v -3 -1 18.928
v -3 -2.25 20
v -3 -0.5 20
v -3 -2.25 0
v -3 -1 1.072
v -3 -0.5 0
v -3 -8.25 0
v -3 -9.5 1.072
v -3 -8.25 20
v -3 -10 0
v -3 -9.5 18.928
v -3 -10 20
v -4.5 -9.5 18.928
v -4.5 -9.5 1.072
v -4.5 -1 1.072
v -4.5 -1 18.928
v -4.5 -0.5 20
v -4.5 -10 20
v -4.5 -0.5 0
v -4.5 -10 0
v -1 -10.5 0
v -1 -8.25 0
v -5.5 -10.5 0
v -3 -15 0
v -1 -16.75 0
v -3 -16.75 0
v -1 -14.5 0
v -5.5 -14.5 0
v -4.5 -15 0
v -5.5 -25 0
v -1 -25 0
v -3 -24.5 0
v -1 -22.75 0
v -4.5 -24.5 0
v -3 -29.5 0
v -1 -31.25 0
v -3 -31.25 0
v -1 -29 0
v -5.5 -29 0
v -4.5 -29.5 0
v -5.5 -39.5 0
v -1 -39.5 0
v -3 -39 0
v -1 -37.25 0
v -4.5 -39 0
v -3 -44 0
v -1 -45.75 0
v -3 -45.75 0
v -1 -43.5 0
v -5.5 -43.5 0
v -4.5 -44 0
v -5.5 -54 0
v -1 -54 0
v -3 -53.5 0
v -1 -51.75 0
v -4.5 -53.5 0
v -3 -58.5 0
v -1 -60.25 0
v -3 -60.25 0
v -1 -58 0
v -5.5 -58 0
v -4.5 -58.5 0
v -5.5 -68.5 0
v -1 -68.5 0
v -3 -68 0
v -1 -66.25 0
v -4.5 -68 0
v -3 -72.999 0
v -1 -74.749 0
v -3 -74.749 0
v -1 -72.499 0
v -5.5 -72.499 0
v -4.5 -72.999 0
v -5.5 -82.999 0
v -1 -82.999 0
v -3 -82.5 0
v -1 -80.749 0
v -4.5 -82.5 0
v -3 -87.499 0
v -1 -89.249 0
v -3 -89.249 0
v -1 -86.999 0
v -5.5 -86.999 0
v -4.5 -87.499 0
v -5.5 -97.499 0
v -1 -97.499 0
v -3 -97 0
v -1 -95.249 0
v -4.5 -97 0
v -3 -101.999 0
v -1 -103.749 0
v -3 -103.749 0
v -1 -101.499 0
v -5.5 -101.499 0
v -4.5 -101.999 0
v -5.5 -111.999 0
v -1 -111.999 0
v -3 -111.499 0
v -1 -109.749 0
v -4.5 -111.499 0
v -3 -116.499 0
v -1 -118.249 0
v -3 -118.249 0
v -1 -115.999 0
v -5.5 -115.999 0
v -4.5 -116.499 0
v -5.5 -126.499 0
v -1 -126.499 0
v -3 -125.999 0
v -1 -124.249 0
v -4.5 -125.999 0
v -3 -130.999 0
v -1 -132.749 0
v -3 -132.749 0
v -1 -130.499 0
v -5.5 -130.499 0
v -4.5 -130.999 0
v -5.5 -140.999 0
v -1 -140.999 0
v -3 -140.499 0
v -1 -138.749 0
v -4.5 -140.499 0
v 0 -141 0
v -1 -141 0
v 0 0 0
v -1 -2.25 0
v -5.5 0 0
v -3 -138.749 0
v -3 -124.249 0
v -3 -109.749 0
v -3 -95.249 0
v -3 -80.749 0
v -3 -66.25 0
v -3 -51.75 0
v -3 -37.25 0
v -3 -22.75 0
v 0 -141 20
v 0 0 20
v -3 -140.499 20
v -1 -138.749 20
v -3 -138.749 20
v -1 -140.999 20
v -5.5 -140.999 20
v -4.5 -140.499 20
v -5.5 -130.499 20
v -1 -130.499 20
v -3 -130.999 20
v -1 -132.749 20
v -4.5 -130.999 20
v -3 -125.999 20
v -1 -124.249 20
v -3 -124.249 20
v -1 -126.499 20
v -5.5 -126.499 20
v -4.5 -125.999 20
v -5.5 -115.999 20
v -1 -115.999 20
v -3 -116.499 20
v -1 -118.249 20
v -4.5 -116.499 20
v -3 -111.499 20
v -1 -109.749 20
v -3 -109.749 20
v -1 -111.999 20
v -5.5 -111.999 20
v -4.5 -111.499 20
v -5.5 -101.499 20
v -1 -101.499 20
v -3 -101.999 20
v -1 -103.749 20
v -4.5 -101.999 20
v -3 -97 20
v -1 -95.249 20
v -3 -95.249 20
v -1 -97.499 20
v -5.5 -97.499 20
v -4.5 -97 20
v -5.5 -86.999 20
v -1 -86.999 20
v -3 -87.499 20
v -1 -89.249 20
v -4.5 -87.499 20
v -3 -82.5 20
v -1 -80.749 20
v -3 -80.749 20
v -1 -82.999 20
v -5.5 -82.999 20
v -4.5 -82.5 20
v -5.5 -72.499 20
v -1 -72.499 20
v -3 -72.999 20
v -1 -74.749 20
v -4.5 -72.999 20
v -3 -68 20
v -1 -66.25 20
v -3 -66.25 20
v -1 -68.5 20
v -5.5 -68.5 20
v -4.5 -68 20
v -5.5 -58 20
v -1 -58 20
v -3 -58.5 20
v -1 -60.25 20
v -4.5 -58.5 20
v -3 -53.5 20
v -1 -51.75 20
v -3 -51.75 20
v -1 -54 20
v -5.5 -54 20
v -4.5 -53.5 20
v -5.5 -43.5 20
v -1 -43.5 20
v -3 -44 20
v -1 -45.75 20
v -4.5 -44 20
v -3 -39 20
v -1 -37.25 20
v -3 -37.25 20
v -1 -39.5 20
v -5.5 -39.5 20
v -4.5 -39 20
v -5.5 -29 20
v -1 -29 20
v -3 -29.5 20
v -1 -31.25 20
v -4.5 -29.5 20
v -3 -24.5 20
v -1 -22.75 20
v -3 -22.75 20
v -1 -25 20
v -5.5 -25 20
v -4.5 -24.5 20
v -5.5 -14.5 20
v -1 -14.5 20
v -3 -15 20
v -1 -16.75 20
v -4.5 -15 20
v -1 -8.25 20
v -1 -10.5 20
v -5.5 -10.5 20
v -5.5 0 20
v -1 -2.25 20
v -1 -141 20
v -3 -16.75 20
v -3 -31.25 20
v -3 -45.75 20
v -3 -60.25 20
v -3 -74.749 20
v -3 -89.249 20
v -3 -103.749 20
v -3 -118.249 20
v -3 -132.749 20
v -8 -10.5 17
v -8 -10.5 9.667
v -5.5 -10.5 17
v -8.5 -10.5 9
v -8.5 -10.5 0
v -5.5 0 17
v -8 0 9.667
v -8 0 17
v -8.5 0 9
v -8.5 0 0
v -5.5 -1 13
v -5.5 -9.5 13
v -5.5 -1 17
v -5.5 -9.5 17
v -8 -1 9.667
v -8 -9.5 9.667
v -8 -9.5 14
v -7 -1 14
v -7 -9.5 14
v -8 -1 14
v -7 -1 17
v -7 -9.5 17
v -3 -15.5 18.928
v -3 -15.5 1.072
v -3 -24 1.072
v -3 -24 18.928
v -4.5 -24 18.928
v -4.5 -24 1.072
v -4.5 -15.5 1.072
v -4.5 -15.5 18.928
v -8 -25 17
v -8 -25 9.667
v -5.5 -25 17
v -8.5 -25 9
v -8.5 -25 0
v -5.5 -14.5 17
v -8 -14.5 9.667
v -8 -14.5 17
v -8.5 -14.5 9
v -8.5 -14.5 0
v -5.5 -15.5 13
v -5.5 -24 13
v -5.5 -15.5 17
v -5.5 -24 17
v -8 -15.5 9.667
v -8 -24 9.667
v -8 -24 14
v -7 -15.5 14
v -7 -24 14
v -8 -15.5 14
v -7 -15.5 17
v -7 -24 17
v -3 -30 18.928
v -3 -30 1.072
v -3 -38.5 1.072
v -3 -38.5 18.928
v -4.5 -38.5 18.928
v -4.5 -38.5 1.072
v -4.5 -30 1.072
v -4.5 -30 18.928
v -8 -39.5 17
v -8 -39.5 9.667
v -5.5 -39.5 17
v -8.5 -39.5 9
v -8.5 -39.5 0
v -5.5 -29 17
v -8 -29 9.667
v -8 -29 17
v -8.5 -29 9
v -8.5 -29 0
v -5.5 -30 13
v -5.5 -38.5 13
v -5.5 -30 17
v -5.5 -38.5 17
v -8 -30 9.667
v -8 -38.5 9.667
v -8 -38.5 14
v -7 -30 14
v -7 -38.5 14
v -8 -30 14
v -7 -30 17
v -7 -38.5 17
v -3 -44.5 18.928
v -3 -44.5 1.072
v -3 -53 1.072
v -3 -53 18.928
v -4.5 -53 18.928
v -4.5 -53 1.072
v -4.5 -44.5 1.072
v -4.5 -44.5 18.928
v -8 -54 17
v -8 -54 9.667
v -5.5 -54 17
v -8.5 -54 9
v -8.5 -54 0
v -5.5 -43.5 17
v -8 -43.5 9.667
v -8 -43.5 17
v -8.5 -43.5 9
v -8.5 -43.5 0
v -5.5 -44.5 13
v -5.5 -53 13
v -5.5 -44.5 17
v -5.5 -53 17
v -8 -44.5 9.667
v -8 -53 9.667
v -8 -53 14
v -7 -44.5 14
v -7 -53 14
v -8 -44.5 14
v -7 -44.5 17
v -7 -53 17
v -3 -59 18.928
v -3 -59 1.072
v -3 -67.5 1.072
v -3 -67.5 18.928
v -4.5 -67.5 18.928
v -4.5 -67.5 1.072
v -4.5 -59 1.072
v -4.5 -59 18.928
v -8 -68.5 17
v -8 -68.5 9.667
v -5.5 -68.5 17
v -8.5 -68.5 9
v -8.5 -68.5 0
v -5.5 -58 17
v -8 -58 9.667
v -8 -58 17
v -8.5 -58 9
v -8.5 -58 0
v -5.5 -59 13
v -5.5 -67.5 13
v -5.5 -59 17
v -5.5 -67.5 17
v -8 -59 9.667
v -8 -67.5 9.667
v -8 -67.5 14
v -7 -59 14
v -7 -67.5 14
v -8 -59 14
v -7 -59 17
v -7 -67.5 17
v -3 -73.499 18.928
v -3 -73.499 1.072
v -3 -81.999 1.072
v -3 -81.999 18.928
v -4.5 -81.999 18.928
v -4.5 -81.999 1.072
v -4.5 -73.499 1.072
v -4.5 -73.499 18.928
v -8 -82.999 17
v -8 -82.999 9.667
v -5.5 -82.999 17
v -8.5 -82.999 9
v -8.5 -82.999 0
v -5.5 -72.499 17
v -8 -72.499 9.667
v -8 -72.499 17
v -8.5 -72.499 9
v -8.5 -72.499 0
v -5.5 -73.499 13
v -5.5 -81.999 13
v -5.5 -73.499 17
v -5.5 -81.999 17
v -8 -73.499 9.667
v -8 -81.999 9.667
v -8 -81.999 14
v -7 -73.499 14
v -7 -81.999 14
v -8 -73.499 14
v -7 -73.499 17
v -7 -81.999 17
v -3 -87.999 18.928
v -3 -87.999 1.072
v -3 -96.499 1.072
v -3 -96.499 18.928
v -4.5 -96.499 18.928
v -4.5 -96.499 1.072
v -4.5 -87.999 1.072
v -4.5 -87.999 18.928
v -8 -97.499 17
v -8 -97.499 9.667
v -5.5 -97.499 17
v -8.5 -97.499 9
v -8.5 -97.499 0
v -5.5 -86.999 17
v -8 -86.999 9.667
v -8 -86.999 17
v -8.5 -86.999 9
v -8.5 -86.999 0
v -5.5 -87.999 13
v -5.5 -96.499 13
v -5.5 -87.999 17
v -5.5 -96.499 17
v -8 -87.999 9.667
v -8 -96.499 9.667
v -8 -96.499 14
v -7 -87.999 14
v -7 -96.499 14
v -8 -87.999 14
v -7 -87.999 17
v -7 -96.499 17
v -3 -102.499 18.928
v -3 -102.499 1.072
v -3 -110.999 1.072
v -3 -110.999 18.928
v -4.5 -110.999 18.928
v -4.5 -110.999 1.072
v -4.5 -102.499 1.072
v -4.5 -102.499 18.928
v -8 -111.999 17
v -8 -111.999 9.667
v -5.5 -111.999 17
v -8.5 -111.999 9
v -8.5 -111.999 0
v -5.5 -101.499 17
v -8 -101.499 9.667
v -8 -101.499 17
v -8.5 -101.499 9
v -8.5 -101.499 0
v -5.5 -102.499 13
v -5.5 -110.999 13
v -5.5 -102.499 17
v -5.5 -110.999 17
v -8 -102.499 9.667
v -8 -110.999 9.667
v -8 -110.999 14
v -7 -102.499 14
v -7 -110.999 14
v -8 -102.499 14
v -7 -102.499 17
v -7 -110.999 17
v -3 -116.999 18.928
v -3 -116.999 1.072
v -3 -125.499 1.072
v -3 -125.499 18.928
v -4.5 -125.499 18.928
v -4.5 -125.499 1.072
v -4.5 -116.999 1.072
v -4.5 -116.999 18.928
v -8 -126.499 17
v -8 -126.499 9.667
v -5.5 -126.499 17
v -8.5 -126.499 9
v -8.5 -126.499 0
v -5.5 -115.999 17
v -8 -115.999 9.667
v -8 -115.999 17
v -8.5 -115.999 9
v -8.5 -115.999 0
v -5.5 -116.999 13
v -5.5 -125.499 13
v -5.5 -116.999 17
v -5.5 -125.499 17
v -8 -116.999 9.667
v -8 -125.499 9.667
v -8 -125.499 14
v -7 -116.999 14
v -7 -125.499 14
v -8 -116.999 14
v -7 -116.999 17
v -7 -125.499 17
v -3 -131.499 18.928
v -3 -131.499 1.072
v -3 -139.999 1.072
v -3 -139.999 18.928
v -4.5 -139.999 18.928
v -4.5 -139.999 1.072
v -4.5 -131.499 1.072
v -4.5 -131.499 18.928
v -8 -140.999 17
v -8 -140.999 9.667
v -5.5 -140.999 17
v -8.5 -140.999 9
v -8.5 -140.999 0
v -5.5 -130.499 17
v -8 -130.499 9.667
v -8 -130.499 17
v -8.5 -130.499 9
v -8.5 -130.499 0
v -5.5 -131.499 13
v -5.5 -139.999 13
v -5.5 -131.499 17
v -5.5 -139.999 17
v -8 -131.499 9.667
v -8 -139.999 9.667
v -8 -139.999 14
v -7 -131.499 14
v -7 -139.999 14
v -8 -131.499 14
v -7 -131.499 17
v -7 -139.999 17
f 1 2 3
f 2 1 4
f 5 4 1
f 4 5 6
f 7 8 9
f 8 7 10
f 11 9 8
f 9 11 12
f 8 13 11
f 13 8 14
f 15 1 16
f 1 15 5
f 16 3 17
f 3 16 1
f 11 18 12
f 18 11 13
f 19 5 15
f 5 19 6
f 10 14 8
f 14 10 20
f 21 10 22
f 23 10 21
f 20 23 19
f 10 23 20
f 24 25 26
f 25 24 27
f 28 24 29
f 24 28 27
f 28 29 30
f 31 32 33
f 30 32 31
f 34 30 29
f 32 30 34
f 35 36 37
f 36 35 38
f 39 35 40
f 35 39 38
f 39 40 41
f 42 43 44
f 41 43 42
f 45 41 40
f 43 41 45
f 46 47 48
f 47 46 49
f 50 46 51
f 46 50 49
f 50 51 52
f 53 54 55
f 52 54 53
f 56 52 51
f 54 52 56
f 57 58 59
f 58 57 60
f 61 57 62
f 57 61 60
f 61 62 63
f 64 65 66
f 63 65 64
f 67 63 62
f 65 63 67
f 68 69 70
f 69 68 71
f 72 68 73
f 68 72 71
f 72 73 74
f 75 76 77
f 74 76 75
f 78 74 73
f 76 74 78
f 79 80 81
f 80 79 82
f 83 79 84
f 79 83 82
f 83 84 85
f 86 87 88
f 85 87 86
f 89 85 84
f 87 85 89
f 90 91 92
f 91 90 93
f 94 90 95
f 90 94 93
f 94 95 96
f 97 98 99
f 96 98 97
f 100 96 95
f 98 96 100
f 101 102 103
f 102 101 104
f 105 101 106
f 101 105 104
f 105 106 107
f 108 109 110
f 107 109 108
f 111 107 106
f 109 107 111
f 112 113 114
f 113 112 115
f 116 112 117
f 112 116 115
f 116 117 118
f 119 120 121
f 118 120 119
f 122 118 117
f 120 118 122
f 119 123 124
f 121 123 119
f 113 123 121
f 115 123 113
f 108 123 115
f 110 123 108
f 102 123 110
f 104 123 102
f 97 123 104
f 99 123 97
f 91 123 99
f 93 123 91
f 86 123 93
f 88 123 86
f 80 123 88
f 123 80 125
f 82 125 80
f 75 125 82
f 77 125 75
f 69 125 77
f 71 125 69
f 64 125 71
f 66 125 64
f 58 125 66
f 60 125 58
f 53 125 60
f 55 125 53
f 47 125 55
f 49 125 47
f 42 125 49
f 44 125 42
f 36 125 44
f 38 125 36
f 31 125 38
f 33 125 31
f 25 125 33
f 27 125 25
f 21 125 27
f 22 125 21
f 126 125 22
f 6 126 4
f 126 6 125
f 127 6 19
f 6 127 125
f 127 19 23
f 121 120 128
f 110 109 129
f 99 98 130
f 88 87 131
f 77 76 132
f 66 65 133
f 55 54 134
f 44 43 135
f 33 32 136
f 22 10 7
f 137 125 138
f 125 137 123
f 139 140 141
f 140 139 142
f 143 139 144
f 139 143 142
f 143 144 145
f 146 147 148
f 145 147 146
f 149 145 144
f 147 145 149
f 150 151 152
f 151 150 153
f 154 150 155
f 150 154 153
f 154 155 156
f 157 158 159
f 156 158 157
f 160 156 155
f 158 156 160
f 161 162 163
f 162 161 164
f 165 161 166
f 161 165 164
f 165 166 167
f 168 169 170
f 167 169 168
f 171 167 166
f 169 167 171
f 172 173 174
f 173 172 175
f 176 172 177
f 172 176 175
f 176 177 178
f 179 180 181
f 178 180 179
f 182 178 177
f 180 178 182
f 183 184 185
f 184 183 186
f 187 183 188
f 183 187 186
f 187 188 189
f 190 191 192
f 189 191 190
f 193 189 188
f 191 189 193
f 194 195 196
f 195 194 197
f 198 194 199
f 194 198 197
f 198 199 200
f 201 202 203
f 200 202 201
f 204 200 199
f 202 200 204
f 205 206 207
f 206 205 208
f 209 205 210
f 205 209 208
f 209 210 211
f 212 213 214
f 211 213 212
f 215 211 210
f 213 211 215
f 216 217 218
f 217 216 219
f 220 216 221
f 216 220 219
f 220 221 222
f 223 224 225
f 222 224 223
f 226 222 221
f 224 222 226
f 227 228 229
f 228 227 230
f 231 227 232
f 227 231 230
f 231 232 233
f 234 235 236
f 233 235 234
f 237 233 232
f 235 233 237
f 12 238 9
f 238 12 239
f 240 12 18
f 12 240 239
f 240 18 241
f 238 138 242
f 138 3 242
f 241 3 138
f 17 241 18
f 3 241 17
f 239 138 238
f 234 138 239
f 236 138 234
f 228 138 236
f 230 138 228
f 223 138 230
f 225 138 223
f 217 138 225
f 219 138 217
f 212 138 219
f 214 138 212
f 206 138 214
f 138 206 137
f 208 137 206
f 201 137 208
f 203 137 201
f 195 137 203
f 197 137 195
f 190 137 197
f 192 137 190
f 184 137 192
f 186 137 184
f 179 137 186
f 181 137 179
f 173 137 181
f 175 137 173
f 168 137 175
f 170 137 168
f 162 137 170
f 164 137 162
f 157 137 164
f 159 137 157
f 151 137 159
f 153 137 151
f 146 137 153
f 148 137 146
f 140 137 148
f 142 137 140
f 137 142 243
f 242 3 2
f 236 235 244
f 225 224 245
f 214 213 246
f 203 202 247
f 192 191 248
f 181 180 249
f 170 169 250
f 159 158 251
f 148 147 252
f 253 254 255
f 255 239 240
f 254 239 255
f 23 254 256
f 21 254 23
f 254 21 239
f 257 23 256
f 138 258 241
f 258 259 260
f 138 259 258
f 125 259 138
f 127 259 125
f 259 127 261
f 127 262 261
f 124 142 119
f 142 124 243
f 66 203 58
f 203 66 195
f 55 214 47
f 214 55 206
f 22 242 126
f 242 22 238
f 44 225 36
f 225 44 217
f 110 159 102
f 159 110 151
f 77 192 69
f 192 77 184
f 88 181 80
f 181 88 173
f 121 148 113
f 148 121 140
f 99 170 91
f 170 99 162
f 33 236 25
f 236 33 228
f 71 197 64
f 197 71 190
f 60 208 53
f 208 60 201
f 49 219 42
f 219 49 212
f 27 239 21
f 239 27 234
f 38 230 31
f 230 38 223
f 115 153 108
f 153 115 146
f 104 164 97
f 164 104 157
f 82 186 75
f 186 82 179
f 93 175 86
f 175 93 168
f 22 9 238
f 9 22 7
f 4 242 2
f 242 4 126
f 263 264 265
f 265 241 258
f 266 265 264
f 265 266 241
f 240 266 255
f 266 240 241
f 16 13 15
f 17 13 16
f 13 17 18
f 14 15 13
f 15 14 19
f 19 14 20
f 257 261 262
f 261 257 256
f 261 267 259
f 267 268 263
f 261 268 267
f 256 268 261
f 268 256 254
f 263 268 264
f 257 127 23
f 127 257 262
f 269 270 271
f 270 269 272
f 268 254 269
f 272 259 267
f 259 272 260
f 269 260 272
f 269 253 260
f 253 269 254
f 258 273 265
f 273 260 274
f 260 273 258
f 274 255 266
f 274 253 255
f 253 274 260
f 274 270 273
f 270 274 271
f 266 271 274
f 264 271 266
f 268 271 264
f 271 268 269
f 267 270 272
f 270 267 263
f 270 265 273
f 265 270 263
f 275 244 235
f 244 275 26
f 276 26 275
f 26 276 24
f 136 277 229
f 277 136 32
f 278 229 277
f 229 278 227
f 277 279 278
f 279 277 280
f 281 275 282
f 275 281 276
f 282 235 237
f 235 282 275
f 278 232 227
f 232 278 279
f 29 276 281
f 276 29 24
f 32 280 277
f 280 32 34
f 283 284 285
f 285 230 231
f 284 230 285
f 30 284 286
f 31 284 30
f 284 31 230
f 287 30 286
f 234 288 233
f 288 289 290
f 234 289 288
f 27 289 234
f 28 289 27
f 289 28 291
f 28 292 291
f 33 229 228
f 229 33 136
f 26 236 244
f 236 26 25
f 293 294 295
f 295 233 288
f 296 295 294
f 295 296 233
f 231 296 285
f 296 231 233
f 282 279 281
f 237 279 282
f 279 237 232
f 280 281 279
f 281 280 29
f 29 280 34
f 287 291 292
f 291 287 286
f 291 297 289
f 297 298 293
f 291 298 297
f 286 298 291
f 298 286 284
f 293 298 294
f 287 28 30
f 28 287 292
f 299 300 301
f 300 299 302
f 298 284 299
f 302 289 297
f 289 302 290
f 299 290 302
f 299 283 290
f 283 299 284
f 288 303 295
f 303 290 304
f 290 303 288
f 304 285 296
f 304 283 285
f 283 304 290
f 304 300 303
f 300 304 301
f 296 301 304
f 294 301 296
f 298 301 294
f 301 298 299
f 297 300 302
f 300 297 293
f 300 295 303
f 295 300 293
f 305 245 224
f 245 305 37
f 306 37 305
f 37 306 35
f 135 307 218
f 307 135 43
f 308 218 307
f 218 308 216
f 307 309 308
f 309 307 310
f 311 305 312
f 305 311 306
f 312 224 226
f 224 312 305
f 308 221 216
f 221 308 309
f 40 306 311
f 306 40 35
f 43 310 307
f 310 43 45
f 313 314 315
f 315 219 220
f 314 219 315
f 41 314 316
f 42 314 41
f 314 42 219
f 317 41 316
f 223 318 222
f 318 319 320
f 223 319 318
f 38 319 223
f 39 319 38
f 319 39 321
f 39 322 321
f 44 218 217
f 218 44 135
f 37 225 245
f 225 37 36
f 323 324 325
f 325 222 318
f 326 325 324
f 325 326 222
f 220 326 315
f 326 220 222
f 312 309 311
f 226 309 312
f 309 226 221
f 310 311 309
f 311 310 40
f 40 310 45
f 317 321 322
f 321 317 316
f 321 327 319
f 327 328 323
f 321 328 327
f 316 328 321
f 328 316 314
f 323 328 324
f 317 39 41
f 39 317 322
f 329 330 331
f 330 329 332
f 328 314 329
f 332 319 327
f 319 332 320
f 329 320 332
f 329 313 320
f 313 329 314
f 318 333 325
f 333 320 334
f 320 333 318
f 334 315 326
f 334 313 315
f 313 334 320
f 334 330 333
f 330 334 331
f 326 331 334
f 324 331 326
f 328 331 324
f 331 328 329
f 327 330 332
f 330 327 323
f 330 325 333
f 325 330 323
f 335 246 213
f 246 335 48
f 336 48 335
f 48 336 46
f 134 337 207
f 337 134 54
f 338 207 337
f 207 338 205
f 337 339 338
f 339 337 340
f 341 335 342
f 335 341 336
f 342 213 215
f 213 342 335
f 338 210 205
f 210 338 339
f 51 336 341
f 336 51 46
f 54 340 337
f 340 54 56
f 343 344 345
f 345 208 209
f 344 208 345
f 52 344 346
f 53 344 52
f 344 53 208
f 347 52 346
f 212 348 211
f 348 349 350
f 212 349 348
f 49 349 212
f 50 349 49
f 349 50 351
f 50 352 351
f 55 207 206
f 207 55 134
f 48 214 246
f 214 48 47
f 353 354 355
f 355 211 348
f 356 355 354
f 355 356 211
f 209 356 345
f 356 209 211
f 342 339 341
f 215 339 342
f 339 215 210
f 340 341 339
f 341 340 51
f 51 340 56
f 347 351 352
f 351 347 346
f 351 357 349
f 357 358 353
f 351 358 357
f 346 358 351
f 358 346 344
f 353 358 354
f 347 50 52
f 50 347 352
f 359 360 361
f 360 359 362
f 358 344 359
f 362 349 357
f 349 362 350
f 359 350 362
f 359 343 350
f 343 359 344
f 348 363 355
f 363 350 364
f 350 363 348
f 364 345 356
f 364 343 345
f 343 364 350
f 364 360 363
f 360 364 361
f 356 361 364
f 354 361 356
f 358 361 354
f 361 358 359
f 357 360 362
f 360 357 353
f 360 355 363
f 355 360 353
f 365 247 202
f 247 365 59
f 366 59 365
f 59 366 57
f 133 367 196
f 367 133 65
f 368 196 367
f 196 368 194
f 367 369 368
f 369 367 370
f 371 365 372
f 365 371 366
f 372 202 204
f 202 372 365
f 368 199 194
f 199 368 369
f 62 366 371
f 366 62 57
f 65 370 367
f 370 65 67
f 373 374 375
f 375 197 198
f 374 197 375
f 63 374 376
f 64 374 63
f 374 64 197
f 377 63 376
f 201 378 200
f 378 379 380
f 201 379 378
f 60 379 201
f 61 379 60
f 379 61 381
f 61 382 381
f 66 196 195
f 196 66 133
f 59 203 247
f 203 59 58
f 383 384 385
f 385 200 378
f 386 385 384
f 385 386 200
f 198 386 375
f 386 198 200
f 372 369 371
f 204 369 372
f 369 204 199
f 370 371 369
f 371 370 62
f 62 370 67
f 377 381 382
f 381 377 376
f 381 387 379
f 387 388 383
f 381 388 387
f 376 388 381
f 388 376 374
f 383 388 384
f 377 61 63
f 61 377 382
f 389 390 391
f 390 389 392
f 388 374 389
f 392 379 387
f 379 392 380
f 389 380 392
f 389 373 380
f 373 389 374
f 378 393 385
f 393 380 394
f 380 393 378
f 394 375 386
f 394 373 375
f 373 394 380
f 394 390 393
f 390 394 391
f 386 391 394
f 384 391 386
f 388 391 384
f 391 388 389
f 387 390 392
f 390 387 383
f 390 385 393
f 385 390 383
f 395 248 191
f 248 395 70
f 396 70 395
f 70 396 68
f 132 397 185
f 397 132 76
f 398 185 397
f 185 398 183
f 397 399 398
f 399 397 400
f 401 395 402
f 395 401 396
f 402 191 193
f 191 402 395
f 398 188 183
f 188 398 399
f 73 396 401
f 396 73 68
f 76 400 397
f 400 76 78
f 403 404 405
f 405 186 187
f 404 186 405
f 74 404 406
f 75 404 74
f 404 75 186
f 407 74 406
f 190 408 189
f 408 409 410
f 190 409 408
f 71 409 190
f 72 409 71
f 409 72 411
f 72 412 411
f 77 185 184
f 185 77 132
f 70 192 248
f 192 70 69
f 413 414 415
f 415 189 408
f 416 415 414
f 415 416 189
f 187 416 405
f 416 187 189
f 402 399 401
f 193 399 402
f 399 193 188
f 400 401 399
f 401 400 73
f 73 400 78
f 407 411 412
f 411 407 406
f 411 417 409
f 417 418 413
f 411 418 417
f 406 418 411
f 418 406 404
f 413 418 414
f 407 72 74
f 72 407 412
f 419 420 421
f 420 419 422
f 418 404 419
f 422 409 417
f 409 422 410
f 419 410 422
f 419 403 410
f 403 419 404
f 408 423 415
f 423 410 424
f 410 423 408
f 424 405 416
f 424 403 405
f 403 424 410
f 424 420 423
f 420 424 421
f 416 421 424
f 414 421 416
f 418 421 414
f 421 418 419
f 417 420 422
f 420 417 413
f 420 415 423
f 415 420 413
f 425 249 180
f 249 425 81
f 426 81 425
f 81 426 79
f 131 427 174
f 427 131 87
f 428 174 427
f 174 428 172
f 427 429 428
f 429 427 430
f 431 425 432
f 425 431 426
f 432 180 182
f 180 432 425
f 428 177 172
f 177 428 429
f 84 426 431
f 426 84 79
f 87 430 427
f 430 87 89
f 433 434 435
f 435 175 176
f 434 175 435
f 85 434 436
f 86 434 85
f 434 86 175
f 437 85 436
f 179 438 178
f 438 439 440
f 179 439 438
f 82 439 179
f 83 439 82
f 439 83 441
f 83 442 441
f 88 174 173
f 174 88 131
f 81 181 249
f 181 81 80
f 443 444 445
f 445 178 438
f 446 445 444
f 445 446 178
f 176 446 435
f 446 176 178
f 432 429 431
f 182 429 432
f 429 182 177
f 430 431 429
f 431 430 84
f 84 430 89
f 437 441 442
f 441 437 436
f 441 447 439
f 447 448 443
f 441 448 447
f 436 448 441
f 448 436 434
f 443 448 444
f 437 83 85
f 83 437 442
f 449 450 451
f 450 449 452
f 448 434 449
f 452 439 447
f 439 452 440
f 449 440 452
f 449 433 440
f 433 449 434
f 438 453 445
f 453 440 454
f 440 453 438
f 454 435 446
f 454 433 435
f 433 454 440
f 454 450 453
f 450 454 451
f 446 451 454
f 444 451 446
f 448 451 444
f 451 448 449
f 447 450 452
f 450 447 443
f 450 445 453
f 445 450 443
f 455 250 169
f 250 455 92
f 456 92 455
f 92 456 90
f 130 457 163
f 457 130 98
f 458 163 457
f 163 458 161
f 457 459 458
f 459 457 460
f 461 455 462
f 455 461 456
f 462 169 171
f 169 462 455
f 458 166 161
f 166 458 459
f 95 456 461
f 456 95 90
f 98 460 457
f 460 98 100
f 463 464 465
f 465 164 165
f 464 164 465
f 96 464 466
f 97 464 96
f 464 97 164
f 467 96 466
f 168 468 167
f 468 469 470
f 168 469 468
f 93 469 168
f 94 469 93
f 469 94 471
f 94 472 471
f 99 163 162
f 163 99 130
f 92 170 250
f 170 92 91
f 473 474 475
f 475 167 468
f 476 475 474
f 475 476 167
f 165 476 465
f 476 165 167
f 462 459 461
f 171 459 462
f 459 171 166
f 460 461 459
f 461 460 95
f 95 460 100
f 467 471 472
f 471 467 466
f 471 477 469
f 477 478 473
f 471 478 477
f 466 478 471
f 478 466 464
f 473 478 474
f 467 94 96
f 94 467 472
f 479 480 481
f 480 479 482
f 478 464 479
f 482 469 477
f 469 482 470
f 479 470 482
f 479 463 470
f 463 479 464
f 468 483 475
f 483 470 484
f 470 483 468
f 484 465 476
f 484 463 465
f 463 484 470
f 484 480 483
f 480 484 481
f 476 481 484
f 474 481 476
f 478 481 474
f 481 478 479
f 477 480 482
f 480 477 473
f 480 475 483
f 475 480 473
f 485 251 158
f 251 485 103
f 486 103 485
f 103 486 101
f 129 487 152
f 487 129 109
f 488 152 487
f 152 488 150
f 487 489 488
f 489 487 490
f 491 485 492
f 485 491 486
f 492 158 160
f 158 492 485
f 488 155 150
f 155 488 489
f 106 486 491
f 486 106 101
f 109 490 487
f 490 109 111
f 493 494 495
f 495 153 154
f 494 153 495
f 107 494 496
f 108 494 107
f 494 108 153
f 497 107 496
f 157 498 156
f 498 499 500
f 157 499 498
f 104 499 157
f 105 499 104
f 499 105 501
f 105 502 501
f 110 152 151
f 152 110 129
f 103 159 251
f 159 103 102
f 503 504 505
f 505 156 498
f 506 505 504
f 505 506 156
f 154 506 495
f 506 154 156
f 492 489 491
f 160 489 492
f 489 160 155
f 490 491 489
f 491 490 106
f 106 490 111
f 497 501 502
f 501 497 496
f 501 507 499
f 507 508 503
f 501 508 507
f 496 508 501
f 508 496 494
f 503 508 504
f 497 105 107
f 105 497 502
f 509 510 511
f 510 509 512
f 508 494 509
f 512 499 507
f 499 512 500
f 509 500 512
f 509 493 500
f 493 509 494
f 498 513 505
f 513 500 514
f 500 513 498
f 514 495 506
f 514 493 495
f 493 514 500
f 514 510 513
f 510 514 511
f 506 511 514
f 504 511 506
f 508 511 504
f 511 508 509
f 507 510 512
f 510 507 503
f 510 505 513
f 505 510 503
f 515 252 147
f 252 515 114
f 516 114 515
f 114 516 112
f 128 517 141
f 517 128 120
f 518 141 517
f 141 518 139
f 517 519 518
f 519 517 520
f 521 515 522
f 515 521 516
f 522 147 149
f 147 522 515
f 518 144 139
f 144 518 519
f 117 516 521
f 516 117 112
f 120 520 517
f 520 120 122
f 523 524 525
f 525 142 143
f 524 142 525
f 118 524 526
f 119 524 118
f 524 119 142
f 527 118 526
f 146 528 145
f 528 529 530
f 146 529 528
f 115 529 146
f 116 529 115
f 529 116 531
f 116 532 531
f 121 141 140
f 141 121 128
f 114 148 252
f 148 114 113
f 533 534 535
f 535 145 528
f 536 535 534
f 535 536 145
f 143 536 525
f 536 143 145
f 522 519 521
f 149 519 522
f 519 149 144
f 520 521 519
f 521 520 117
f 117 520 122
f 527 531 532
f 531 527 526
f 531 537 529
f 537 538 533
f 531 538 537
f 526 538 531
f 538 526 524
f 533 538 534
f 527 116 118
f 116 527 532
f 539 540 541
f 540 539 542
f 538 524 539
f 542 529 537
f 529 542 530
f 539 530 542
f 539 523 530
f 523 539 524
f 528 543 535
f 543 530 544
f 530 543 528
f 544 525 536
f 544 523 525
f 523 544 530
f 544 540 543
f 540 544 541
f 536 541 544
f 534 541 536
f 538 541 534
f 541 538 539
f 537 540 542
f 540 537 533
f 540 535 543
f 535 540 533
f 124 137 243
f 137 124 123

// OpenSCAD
// Manual SMT cut strip feeder array.

// TODO: cleanup.

/* [Hidden] */
eps1 = 0.0001;
eps2 = 2*eps1;

/* [Setting] */

// Number of feeders.
feeders_count = 10;

// Width of the tape slot (tape width + margin).
tape_slot_width = 8.5;

// Height of the tape slot (tape thickness + margin)
tape_slot_height = 1.5;

// Width of the slot below the tape.
part_slot_width = 6;

// Height of the slot below the tape.
part_slot_height = 2;

// Overall length.
total_length = 20;  

// Spacing between feeders.
inter_feeder_space = 4;


/* [Tweaking] */

// Thickness of side walls.
side_wall_width = 1;

// Thickness of the bottom.
bottom_thickness = 1; 

// Thickness of the top.
top_thickness = 1;


// Taper angle at the tape entry and exit ends.
part_slot_taper_angle = 25;

// Height below the tape peeling bridge.
bridge_gap = 1.5;
// Width of the tape peeling bridge, viewing from the side.
bridge_width = 3;

// Thickness of the tape peeling bridge top.
bridge_top_thickness = 1;

// Distance of the peeling bridge from the front of the part.
bridge_offset = 3;

// Total bridge height.
bridge_height = bridge_gap + bridge_top_thickness;

// Height of the tape peeling ramp.
ramp_height = 3;

// Horizontal length of the tape peeling ramp.
ramp_length = 4;

// Extra length at the high end of the ramp.
ramp_tail_length = 7;

// Horizontal space between bridge and ramp.
ramp_offset_from_bridge = 1;

ramp_offset = bridge_offset + bridge_width + ramp_offset_from_bridge;

// Thickness of the plate that connects feeders.
plate_thickness = bottom_thickness;


base_length = total_length;
base_height = bottom_thickness + part_slot_height + tape_slot_height;
base_width = tape_slot_width + 2*side_wall_width;

ramp_width = base_width;

module tape_slot_taper(x, y, a) {
  translate([x, y, 0])
  rotate([0, 0, a])
  translate([-3*side_wall_width/2, 0, 0])  cube([3*side_wall_width, eps1, tape_slot_height+eps2]);
}

module base_body() {
  cube([base_length, base_width, base_height]);
}

module parts_slot() {
 translate([-eps1, (base_width-part_slot_width)/2, 0]) 
    cube([base_length+eps2, part_slot_width, part_slot_height]);  
}

module tape_slot() {
 a = part_slot_taper_angle;

 translate([-eps1, (base_width-tape_slot_width)/2, 0]) 
     cube([base_length+eps2, tape_slot_width, tape_slot_height+eps2]);

 hull() {
  tape_slot_taper(0,  side_wall_width/2, a);
  tape_slot_taper(0, base_width - side_wall_width/2, -a);
 }

 hull() {
 tape_slot_taper(total_length, side_wall_width/2, -a);
 tape_slot_taper(total_length, base_width - side_wall_width/2, a);
 }
}


module base_main() {
  difference() {
    base_body();
    translate([0, 0, bottom_thickness]) parts_slot();
    translate([0, 0, bottom_thickness+part_slot_height-eps1]) tape_slot();
  }
}

module top_ramp() {
  translate([0, (base_width-ramp_width)/2, 0]) 
  hull() {
    cube([eps1, ramp_width, eps1]);
    translate([ramp_length, 0, 0])  cube([eps1, ramp_width, ramp_height]);
    translate([base_length - ramp_offset, 0, 0])  cube([eps1, ramp_width, ramp_height]);
  }
}

//module top_hole(x, l, w) {
//  translate([x, (base_width-w)/2, -eps1]) cube([l, w, top_thickness + eps2]);
//}

module bridge_main() {
  bridge_height = bridge_gap + bridge_top_thickness;
  difference() {
    cube([bridge_width, base_width, bridge_height]);
    translate([-eps1, (base_width - tape_slot_width)/2, -eps1]) cube([bridge_width+eps2, tape_slot_width, bridge_gap+eps1]);
  }
  cube([total_length - bridge_offset, side_wall_width, bridge_height]); 

  translate([0, base_width - side_wall_width, 0]) cube([total_length - bridge_offset, side_wall_width, bridge_height]); 
}

module top_main() {
  difference() {
  cube([base_length, base_width, top_thickness]);
  //top_hole(top_hole_offset, top_hole_length, tape_slot_width);
}
  translate([ramp_offset, 0, top_thickness - eps1]) top_ramp();
}

module one_feeder() {
   base_main();
   translate([0, 0, base_height-eps1]) top_main();
   translate([bridge_offset, 0,  base_height + top_thickness - eps2]) bridge_main();
}

module main() {
  width = feeders_count*base_width + (feeders_count-1)*inter_feeder_space; 
  for ( i = [0 : feeders_count-1] ) {
    translate([0, i*(base_width + inter_feeder_space - eps1), 0]) one_feeder();
  }
  cube([base_length, width, plate_thickness]);
}

// NOTE: rotation around z for better view angle on thingieverse.
translate([0, 0, base_length]) rotate([0, 90, 180]) main();
